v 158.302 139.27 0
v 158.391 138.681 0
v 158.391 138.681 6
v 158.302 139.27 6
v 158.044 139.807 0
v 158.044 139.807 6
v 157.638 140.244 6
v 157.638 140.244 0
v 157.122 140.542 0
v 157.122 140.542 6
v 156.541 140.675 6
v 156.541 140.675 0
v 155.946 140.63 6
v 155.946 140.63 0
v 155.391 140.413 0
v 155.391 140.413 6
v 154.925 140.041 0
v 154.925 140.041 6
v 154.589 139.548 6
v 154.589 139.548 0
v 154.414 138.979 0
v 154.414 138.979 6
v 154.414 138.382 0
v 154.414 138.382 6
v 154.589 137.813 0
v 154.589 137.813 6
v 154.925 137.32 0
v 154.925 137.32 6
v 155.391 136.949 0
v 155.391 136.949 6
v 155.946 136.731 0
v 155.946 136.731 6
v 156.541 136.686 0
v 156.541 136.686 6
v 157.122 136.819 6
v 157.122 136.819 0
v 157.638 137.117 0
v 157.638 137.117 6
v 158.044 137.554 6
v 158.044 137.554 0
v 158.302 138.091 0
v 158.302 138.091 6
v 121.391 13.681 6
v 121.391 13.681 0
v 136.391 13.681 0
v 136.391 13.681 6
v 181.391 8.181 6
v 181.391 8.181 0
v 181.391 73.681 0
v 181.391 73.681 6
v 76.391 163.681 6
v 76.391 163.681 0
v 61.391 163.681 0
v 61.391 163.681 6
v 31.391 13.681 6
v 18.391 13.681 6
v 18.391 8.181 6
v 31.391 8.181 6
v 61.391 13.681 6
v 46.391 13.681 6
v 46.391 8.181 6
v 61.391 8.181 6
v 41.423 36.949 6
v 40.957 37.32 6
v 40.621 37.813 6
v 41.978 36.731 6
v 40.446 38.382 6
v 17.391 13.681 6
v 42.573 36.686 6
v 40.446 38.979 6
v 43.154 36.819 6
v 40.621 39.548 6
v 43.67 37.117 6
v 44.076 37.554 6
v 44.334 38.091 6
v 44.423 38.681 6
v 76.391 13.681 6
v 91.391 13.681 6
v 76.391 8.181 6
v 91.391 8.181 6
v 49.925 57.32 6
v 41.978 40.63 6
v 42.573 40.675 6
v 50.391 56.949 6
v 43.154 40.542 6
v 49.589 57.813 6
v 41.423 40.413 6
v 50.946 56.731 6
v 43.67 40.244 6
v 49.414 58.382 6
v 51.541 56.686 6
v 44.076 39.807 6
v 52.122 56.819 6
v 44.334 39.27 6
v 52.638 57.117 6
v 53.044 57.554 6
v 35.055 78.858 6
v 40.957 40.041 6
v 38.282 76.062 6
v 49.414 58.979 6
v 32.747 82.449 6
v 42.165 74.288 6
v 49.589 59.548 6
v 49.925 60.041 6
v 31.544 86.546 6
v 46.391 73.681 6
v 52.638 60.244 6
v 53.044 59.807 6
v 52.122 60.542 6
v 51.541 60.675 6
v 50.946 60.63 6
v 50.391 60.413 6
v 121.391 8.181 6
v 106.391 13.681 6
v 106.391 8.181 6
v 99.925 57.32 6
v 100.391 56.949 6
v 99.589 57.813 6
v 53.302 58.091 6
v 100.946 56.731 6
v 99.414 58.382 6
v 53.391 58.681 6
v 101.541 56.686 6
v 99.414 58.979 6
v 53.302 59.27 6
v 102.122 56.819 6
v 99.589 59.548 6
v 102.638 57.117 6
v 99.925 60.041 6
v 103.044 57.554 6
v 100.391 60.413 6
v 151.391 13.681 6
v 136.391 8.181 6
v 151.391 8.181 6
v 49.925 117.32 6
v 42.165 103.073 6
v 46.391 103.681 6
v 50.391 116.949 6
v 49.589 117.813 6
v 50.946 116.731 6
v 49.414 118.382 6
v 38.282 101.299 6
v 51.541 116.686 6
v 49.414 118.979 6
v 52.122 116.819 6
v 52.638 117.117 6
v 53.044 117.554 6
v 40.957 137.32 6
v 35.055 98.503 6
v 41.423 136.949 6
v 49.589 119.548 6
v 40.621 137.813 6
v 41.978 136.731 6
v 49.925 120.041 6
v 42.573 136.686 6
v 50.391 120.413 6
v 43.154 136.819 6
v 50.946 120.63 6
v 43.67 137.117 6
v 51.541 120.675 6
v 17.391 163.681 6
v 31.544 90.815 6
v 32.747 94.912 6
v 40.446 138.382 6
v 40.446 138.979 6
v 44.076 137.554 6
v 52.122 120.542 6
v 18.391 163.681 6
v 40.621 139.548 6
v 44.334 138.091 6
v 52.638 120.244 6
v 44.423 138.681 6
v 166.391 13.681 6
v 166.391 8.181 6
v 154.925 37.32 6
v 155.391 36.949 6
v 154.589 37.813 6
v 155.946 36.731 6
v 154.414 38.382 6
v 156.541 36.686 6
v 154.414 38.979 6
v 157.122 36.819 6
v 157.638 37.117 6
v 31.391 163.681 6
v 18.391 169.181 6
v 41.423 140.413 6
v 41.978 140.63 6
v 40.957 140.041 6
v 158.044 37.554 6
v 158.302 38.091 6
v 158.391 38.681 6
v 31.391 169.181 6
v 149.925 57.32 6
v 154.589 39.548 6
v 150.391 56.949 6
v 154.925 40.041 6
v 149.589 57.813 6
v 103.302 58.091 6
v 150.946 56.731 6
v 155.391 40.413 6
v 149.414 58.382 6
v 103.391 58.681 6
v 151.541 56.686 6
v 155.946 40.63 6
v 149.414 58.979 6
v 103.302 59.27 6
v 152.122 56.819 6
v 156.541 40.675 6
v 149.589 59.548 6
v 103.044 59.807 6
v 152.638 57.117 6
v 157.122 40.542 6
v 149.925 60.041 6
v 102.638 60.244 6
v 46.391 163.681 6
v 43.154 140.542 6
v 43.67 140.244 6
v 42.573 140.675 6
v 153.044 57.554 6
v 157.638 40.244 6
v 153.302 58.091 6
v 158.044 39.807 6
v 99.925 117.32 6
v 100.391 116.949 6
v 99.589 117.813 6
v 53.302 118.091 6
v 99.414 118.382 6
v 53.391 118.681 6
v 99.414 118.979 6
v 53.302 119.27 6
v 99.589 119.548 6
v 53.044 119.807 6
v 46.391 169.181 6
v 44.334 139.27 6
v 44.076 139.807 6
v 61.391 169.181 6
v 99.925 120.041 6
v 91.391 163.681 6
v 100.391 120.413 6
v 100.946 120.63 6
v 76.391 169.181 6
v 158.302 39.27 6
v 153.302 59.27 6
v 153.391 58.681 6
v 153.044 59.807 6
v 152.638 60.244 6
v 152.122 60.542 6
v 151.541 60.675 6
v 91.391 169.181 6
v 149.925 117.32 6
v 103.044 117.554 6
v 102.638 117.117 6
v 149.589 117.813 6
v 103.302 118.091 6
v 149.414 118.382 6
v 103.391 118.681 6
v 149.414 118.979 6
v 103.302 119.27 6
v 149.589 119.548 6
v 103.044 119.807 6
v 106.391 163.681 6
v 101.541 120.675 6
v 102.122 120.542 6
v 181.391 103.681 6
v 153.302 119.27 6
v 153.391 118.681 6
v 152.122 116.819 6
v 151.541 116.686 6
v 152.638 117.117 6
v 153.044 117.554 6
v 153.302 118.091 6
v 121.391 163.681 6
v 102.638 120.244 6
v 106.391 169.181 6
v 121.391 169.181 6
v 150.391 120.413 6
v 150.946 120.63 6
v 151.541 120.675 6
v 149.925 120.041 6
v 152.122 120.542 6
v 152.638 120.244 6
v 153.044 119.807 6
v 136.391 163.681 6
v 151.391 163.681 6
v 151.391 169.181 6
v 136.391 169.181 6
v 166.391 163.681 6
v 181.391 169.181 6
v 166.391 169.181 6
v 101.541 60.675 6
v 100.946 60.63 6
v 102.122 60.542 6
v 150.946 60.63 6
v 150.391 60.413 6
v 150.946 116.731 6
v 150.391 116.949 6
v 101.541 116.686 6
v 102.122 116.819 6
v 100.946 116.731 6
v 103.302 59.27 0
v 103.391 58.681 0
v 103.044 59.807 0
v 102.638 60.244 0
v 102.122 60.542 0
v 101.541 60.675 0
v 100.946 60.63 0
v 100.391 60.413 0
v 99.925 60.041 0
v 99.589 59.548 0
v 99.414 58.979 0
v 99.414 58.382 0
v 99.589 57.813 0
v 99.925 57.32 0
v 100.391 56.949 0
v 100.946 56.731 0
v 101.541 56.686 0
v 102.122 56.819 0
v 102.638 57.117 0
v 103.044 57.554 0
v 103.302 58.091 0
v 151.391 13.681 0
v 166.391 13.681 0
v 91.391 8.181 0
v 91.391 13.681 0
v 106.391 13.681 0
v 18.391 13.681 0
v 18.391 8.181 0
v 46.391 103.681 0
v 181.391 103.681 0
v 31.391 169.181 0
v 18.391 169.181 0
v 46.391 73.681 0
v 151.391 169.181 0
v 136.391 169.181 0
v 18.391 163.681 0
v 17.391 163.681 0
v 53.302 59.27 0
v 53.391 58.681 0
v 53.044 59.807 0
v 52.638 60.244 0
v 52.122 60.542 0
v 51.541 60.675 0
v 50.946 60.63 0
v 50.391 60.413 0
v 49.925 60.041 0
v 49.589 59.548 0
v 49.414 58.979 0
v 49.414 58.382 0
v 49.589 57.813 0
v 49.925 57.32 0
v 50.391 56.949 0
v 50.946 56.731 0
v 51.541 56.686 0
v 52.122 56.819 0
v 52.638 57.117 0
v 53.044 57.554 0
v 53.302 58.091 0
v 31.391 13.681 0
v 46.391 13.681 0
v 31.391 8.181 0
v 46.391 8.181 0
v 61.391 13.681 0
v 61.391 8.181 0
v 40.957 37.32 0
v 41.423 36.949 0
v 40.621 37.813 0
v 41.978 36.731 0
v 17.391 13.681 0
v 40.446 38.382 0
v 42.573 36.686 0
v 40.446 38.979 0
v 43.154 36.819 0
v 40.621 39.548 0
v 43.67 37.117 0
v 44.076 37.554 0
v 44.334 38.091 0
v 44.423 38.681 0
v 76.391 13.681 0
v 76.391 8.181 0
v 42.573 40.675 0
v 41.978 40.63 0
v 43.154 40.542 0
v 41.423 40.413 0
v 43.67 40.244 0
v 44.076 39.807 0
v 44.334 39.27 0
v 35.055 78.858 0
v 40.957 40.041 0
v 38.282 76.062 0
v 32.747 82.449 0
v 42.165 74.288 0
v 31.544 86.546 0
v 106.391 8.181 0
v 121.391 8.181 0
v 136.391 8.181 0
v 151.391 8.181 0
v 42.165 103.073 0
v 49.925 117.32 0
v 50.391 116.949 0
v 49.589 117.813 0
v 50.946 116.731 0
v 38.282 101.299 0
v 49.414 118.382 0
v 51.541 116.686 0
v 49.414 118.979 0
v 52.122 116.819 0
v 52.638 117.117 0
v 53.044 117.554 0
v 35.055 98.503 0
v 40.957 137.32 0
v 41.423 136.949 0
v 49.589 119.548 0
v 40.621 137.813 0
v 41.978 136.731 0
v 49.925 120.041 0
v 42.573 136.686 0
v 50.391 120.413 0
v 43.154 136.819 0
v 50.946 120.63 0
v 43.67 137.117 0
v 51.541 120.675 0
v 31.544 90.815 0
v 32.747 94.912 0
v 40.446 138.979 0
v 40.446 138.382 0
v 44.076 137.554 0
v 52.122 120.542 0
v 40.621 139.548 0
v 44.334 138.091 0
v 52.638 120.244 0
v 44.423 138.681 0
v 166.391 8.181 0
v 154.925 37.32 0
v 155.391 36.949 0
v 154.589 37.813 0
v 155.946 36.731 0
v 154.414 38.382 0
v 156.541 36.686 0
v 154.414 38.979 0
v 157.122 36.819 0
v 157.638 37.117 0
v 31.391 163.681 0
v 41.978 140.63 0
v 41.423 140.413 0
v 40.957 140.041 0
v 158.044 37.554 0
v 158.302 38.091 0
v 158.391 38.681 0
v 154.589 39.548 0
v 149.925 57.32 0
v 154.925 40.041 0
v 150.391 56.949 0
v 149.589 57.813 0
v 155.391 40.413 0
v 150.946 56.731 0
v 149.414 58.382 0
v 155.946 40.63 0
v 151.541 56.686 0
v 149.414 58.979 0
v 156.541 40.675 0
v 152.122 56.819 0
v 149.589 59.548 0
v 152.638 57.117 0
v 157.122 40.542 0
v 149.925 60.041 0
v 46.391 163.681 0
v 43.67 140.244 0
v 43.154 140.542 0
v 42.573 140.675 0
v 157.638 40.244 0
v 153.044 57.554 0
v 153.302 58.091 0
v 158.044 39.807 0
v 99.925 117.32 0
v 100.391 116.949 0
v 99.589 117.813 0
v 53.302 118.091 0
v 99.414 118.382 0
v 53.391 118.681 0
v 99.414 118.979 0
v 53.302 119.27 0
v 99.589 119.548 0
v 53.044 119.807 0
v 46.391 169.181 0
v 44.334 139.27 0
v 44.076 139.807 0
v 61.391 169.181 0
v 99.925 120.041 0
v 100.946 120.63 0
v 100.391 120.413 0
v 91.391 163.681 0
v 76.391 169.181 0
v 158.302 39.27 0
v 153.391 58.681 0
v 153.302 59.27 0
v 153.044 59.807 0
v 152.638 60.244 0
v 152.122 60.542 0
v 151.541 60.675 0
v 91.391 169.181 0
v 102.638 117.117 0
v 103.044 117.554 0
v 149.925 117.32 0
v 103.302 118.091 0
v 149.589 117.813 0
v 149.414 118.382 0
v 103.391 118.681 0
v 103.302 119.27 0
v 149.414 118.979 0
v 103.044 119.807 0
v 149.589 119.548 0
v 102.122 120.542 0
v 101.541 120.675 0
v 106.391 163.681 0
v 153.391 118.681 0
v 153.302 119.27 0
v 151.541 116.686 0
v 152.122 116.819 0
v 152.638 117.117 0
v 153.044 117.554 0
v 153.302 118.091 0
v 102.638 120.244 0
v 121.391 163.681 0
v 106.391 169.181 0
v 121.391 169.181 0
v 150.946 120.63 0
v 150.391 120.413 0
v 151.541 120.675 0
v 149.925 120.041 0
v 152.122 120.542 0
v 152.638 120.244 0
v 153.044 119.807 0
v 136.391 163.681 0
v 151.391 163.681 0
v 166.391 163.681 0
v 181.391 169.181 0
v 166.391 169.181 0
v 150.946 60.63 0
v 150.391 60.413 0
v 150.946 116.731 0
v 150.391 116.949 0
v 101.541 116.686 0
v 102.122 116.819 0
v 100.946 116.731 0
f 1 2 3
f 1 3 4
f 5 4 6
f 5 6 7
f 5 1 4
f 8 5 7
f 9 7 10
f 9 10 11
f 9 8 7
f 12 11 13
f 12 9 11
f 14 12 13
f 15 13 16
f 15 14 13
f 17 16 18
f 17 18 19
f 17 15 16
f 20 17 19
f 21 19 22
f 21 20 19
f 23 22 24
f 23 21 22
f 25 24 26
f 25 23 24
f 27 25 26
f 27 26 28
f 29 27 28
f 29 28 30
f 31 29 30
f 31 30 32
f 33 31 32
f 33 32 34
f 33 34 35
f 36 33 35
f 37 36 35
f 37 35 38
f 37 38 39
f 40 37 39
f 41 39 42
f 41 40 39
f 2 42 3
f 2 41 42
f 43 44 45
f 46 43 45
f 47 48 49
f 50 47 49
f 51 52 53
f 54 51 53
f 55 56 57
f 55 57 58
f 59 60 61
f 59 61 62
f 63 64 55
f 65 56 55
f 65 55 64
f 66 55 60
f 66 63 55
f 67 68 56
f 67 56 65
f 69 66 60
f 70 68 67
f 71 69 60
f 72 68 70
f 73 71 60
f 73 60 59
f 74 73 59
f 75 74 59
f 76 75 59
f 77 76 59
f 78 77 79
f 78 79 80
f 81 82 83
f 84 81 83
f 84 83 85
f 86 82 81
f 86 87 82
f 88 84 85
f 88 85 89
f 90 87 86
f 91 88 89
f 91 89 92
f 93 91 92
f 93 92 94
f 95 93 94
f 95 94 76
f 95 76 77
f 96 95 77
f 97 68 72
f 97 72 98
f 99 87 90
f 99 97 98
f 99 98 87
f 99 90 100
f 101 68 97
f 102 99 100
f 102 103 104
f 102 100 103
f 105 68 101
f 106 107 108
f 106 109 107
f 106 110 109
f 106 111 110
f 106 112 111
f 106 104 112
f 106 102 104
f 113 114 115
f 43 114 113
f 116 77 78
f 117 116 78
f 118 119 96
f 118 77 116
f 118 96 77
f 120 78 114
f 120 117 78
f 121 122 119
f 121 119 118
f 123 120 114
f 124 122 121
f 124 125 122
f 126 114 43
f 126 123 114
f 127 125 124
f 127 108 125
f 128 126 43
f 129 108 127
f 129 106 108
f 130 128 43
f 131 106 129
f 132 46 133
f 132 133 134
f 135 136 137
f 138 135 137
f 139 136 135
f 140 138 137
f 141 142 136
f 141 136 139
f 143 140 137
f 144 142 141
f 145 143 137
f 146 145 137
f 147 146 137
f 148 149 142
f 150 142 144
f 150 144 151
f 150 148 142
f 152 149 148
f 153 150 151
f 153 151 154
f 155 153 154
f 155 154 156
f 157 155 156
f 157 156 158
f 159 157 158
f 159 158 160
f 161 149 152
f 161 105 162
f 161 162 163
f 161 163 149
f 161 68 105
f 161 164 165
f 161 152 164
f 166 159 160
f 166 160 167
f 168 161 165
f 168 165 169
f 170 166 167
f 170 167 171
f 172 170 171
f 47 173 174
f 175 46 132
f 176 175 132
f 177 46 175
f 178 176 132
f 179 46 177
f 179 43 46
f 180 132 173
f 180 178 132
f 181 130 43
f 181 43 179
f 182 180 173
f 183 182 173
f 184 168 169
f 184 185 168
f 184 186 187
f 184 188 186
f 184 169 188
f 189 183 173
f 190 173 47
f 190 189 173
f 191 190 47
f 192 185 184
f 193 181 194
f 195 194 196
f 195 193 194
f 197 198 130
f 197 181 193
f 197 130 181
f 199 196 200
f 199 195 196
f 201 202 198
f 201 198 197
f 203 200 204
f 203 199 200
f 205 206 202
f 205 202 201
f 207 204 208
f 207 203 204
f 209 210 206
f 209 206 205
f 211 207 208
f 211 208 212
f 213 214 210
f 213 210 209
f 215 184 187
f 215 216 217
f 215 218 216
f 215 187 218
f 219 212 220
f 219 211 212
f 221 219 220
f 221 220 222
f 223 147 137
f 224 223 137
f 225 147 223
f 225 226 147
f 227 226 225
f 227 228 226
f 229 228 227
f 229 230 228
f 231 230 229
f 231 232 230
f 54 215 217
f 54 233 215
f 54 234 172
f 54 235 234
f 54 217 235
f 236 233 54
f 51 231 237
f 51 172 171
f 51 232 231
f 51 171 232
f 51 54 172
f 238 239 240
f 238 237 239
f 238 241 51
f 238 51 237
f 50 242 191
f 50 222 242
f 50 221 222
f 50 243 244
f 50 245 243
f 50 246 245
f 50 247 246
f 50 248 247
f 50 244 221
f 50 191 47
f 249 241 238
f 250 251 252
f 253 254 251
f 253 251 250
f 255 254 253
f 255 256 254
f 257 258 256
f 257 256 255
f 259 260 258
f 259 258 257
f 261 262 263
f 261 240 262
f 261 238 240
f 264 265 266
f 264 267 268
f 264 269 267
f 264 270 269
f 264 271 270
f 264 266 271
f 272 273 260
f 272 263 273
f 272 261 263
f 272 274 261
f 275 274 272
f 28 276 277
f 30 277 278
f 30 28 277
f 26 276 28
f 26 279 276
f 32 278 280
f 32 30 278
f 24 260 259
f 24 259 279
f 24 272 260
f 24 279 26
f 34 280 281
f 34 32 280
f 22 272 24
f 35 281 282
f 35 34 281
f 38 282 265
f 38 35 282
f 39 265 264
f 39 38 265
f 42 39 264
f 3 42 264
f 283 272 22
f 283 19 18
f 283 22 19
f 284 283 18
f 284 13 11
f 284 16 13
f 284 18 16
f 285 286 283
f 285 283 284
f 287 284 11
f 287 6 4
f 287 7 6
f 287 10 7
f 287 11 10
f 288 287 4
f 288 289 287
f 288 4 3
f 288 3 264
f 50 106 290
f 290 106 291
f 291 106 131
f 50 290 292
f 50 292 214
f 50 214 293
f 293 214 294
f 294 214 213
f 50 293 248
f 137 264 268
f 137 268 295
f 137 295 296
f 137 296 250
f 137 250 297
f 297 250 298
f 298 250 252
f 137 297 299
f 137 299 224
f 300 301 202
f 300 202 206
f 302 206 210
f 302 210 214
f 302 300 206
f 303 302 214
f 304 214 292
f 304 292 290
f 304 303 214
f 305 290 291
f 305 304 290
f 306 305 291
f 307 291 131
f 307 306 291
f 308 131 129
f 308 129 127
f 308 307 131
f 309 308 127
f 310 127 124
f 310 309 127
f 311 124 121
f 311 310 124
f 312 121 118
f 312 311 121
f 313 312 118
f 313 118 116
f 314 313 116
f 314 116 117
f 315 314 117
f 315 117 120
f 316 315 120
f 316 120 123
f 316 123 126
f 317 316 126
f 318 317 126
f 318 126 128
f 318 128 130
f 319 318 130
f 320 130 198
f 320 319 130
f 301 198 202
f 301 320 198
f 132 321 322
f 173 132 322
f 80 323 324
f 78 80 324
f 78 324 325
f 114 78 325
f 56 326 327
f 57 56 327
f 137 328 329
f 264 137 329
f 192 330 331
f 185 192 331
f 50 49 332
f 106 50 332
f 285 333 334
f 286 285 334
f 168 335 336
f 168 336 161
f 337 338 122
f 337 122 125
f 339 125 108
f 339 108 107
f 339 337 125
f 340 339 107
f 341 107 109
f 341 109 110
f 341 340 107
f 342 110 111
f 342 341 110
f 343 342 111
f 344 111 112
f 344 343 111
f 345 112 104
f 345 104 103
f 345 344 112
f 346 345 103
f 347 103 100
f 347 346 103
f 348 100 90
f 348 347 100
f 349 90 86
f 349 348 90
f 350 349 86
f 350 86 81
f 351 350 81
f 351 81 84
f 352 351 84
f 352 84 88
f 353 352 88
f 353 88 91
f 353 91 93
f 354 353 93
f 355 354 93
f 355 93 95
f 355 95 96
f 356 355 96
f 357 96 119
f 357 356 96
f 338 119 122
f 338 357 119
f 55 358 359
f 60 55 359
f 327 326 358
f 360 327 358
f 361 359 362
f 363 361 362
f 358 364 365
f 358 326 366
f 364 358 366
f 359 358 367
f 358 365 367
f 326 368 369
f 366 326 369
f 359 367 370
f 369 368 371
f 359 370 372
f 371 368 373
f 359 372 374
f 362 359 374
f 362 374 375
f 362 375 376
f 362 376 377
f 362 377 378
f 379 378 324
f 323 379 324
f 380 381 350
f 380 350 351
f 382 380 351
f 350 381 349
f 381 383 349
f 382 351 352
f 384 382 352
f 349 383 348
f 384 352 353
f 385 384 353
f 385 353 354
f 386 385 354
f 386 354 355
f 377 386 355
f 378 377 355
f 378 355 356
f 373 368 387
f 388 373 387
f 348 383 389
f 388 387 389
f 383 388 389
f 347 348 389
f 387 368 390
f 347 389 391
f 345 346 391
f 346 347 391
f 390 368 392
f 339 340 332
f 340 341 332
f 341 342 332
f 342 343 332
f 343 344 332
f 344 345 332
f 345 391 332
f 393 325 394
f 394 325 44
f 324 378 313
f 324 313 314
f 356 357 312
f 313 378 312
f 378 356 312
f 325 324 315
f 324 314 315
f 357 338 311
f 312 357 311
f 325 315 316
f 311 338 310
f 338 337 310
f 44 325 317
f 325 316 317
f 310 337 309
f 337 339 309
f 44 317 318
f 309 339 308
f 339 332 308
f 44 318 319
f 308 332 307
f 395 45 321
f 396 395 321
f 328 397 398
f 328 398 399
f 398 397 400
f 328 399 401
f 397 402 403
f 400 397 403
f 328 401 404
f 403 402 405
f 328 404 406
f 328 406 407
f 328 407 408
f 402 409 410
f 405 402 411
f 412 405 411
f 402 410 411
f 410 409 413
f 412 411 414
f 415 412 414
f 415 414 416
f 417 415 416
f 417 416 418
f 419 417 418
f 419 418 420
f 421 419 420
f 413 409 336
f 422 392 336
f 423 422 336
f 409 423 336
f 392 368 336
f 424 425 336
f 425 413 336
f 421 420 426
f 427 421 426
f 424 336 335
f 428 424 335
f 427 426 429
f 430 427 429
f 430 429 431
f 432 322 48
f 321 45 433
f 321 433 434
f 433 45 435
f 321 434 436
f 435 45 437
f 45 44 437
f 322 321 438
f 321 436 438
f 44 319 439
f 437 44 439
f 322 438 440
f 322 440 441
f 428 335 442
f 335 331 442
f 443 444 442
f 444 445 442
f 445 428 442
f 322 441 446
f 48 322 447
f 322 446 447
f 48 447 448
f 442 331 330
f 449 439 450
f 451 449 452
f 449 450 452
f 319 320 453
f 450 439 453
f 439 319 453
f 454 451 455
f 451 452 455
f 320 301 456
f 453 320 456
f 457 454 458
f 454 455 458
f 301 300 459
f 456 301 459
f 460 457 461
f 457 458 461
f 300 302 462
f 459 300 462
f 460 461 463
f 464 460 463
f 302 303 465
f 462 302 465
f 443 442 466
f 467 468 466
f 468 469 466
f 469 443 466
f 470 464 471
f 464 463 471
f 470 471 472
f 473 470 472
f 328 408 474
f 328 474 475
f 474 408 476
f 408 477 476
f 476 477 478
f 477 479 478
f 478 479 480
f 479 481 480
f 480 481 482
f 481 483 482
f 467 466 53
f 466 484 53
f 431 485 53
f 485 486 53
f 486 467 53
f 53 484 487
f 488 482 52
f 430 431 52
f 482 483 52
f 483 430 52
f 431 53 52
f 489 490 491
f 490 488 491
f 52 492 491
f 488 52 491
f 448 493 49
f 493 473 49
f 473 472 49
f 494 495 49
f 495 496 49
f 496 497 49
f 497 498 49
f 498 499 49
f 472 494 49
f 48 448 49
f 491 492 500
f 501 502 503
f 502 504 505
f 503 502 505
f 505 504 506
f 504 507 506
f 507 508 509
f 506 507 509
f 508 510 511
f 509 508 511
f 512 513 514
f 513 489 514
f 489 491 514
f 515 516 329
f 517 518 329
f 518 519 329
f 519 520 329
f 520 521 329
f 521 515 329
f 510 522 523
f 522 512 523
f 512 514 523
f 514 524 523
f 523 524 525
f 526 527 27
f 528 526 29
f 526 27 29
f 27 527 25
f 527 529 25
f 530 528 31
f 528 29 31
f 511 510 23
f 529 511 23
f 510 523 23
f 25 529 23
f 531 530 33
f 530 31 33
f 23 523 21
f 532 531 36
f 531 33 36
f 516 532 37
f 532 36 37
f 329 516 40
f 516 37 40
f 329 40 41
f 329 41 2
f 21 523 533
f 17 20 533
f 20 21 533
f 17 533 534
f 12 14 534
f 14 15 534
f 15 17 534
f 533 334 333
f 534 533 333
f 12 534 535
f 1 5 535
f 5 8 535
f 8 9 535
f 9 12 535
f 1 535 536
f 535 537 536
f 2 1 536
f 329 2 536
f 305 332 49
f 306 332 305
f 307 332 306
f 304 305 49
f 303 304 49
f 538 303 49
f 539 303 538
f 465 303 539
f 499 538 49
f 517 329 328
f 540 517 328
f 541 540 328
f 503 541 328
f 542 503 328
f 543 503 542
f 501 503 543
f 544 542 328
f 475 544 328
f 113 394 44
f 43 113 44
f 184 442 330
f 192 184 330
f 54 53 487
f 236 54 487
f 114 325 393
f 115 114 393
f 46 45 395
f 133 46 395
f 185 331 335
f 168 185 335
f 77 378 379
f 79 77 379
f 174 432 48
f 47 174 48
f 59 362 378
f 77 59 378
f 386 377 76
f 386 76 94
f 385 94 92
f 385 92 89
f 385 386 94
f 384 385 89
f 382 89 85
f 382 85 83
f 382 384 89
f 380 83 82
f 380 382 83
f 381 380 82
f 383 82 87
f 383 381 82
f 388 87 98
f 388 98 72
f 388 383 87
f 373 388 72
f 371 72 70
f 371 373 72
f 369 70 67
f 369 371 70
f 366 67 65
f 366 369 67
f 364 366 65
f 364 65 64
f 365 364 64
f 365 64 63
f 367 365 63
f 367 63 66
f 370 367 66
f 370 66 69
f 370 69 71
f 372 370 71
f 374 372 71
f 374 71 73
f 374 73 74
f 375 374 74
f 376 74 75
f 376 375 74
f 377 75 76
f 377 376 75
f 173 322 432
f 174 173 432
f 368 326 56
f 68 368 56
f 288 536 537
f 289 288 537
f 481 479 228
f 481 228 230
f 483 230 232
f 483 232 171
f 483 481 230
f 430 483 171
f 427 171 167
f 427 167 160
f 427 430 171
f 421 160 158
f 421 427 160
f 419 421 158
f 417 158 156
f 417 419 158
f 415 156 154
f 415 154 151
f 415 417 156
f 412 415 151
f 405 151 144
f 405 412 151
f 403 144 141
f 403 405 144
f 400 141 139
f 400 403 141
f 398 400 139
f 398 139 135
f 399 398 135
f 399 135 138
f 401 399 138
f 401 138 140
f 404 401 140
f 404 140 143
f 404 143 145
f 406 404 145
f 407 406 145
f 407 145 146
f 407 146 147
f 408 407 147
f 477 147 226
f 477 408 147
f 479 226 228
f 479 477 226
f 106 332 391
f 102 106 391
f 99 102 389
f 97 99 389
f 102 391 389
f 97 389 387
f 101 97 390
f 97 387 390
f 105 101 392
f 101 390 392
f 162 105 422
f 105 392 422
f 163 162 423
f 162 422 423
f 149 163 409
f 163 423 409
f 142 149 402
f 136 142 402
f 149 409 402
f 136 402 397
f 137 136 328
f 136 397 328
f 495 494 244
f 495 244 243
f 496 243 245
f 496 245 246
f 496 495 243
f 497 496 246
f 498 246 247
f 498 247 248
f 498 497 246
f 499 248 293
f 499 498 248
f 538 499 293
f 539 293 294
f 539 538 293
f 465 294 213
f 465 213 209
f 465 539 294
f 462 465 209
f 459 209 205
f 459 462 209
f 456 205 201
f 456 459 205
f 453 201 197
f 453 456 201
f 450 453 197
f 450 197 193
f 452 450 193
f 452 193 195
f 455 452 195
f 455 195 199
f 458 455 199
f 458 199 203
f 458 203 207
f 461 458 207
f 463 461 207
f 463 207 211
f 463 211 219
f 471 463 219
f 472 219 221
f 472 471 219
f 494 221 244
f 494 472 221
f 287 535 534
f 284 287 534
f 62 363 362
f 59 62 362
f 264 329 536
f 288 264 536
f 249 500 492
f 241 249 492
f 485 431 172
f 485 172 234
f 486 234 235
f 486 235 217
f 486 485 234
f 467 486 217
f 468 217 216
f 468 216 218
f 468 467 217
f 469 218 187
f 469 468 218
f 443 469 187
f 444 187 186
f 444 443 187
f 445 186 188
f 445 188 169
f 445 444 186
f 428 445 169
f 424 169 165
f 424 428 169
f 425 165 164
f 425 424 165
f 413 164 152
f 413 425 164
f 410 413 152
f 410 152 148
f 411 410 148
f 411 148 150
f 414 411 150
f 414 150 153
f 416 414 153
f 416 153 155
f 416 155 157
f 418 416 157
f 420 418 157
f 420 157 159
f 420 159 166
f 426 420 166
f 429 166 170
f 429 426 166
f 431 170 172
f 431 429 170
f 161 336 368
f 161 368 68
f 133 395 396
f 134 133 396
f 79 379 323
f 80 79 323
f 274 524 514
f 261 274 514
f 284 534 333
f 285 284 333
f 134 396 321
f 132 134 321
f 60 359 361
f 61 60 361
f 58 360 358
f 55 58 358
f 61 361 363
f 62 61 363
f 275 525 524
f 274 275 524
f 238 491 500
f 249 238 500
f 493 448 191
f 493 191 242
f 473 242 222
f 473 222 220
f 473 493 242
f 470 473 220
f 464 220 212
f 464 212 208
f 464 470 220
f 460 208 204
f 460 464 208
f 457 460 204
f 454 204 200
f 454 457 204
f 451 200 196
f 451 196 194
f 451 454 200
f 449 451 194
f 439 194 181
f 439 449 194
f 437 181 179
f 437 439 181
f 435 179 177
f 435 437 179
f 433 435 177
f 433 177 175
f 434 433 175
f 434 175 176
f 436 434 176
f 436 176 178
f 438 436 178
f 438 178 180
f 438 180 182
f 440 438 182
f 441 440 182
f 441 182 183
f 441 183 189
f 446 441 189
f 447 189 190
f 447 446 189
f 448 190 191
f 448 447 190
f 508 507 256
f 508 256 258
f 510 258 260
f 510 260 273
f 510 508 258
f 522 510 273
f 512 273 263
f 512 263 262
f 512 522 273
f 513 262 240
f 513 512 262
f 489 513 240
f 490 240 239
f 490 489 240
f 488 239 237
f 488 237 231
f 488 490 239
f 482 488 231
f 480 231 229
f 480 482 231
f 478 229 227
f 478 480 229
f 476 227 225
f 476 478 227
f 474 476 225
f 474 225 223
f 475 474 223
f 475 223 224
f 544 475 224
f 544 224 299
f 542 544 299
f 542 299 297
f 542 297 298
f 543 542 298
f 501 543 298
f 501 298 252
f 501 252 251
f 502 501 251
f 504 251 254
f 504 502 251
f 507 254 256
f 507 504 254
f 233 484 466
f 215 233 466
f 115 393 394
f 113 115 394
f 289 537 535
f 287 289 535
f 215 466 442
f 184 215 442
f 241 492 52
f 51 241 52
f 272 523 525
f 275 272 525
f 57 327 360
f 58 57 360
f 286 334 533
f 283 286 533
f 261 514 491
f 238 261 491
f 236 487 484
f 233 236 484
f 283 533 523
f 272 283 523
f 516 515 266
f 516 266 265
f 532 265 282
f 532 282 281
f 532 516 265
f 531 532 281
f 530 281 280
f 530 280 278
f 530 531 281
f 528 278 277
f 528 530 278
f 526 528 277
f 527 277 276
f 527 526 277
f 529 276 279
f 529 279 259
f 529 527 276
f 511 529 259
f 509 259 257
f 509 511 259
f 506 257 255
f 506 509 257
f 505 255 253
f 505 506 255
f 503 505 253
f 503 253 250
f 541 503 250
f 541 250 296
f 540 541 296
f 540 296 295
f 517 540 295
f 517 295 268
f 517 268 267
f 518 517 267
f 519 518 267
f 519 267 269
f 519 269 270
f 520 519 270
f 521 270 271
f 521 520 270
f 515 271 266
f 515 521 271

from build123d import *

# Parameters (mm, degrees)
MODEL_R             = 2
BOSS_EXTRUDE1_DEPTH = 6
SKETCH2_W           = 6
SKETCH2_H           = 150
BOSS_EXTRUDE2_DEPTH = 1


with BuildPart() as part:
    # Model → Boss-Extrude1 (new body)
    with BuildSketch(Plane.XY):
        with BuildLine():
            Line((31.391248016, 13.680569099), (46.391248016, 13.680569099))
            Line((46.391248016, 13.680569099), (46.391248016, 8.180569099))
            Line((46.391248016, 8.180569099), (61.391248016, 8.180569099))
            Line((61.391248016, 8.180569099), (61.391248016, 13.680569099))
            Line((61.391248016, 13.680569099), (76.391248016, 13.680569099))
            Line((76.391248016, 13.680569099), (76.391248016, 8.180569099))
            Line((76.391248016, 8.180569099), (91.391248016, 8.180569099))
            Line((91.391248016, 8.180569099), (91.391248016, 13.680569099))
            Line((91.391248016, 13.680569099), (106.391248016, 13.680569099))
            Line((106.391248016, 13.680569099), (106.391248016, 8.180569099))
            Line((106.391248016, 8.180569099), (121.391248016, 8.180569099))
            Line((121.391248016, 8.180569099), (121.391248016, 13.680569099))
            Line((121.391248016, 13.680569099), (136.391248016, 13.680569099))
            Line((136.391248016, 13.680569099), (136.391248016, 8.180569099))
            Line((136.391248016, 8.180569099), (151.391248016, 8.180569099))
            Line((151.391248016, 8.180569099), (151.391248016, 13.680569099))
            Line((151.391248016, 13.680569099), (166.391248016, 13.680569099))
            Line((166.391248016, 13.680569099), (166.391248016, 8.180569099))
            Line((166.391248016, 8.180569099), (181.391248016, 8.180569099))
            Line((181.391248016, 8.180569099), (181.391248016, 73.680569099))
            Line((181.391248016, 73.680569099), (46.391248016, 73.680569099))
            ThreePointArc((46.391248016, 73.680569099), (31.391248016, 88.680569099), (46.391248016, 103.680569099))
            Line((46.391248016, 103.680569099), (181.391248016, 103.680569099))
            Line((181.391248016, 103.680569099), (181.391248016, 169.180569099))
            Line((181.391248016, 169.180569099), (166.391248016, 169.180569099))
            Line((166.391248016, 169.180569099), (166.391248016, 163.680569099))
            Line((166.391248016, 163.680569099), (151.391248016, 163.680569099))
            Line((151.391248016, 163.680569099), (151.391248016, 169.180569099))
            Line((151.391248016, 169.180569099), (136.391248016, 169.180569099))
            Line((136.391248016, 169.180569099), (136.391248016, 163.680569099))
            Line((136.391248016, 163.680569099), (121.391248016, 163.680569099))
            Line((121.391248016, 163.680569099), (121.391248016, 169.180569099))
            Line((121.391248016, 169.180569099), (106.391248016, 169.180569099))
            Line((106.391248016, 169.180569099), (106.391248016, 163.680569099))
            Line((106.391248016, 163.680569099), (91.391248016, 163.680569099))
            Line((91.391248016, 163.680569099), (91.391248016, 169.180569099))
            Line((91.391248016, 169.180569099), (76.391248016, 169.180569099))
            Line((76.391248016, 169.180569099), (76.391248016, 163.680569099))
            Line((76.391248016, 163.680569099), (61.391248016, 163.680569099))
            Line((61.391248016, 163.680569099), (61.391248016, 169.180569099))
            Line((61.391248016, 169.180569099), (46.391248016, 169.180569099))
            Line((46.391248016, 169.180569099), (46.391248016, 163.680569099))
            Line((46.391248016, 163.680569099), (31.391248016, 163.680569099))
            Line((31.391248016, 163.680569099), (31.391248016, 169.180569099))
            Line((31.391248016, 169.180569099), (18.391248016, 169.180569099))
            Line((18.391248016, 169.180569099), (18.391248016, 8.180569099))
            Line((18.391248016, 8.180569099), (31.391248016, 8.180569099))
            Line((31.391248016, 8.180569099), (31.391248016, 13.680569099))
        make_face()
        with Locations((51.391248016, 58.680569099)):
            Circle(MODEL_R, mode=Mode.SUBTRACT)
        with Locations((101.391248016, 58.680569099)):
            Circle(MODEL_R, mode=Mode.SUBTRACT)
        with Locations((151.391248016, 58.680569099)):
            Circle(MODEL_R, mode=Mode.SUBTRACT)
        with Locations((42.423326125, 38.680569099)):
            Circle(MODEL_R, mode=Mode.SUBTRACT)
        with Locations((156.391248016, 38.680569099)):
            Circle(MODEL_R, mode=Mode.SUBTRACT)
        with Locations((51.391248016, 118.680569099)):
            Circle(MODEL_R, mode=Mode.SUBTRACT)
        with Locations((101.391248016, 118.680569099)):
            Circle(MODEL_R, mode=Mode.SUBTRACT)
        with Locations((151.391248016, 118.680569099)):
            Circle(MODEL_R, mode=Mode.SUBTRACT)
        with Locations((42.423326125, 138.680569099)):
            Circle(MODEL_R, mode=Mode.SUBTRACT)
        with Locations((156.391248016, 138.680569099)):
            Circle(MODEL_R, mode=Mode.SUBTRACT)
    extrude(amount=BOSS_EXTRUDE1_DEPTH)

    # Sketch2 → Boss-Extrude2 (add)
    with BuildSketch(Plane.ZY.offset(-18.391248016)):
        with Locations((3, 88.680569099)):
            Rectangle(SKETCH2_W, SKETCH2_H)
    extrude(amount=BOSS_EXTRUDE2_DEPTH)


solid = part.part
